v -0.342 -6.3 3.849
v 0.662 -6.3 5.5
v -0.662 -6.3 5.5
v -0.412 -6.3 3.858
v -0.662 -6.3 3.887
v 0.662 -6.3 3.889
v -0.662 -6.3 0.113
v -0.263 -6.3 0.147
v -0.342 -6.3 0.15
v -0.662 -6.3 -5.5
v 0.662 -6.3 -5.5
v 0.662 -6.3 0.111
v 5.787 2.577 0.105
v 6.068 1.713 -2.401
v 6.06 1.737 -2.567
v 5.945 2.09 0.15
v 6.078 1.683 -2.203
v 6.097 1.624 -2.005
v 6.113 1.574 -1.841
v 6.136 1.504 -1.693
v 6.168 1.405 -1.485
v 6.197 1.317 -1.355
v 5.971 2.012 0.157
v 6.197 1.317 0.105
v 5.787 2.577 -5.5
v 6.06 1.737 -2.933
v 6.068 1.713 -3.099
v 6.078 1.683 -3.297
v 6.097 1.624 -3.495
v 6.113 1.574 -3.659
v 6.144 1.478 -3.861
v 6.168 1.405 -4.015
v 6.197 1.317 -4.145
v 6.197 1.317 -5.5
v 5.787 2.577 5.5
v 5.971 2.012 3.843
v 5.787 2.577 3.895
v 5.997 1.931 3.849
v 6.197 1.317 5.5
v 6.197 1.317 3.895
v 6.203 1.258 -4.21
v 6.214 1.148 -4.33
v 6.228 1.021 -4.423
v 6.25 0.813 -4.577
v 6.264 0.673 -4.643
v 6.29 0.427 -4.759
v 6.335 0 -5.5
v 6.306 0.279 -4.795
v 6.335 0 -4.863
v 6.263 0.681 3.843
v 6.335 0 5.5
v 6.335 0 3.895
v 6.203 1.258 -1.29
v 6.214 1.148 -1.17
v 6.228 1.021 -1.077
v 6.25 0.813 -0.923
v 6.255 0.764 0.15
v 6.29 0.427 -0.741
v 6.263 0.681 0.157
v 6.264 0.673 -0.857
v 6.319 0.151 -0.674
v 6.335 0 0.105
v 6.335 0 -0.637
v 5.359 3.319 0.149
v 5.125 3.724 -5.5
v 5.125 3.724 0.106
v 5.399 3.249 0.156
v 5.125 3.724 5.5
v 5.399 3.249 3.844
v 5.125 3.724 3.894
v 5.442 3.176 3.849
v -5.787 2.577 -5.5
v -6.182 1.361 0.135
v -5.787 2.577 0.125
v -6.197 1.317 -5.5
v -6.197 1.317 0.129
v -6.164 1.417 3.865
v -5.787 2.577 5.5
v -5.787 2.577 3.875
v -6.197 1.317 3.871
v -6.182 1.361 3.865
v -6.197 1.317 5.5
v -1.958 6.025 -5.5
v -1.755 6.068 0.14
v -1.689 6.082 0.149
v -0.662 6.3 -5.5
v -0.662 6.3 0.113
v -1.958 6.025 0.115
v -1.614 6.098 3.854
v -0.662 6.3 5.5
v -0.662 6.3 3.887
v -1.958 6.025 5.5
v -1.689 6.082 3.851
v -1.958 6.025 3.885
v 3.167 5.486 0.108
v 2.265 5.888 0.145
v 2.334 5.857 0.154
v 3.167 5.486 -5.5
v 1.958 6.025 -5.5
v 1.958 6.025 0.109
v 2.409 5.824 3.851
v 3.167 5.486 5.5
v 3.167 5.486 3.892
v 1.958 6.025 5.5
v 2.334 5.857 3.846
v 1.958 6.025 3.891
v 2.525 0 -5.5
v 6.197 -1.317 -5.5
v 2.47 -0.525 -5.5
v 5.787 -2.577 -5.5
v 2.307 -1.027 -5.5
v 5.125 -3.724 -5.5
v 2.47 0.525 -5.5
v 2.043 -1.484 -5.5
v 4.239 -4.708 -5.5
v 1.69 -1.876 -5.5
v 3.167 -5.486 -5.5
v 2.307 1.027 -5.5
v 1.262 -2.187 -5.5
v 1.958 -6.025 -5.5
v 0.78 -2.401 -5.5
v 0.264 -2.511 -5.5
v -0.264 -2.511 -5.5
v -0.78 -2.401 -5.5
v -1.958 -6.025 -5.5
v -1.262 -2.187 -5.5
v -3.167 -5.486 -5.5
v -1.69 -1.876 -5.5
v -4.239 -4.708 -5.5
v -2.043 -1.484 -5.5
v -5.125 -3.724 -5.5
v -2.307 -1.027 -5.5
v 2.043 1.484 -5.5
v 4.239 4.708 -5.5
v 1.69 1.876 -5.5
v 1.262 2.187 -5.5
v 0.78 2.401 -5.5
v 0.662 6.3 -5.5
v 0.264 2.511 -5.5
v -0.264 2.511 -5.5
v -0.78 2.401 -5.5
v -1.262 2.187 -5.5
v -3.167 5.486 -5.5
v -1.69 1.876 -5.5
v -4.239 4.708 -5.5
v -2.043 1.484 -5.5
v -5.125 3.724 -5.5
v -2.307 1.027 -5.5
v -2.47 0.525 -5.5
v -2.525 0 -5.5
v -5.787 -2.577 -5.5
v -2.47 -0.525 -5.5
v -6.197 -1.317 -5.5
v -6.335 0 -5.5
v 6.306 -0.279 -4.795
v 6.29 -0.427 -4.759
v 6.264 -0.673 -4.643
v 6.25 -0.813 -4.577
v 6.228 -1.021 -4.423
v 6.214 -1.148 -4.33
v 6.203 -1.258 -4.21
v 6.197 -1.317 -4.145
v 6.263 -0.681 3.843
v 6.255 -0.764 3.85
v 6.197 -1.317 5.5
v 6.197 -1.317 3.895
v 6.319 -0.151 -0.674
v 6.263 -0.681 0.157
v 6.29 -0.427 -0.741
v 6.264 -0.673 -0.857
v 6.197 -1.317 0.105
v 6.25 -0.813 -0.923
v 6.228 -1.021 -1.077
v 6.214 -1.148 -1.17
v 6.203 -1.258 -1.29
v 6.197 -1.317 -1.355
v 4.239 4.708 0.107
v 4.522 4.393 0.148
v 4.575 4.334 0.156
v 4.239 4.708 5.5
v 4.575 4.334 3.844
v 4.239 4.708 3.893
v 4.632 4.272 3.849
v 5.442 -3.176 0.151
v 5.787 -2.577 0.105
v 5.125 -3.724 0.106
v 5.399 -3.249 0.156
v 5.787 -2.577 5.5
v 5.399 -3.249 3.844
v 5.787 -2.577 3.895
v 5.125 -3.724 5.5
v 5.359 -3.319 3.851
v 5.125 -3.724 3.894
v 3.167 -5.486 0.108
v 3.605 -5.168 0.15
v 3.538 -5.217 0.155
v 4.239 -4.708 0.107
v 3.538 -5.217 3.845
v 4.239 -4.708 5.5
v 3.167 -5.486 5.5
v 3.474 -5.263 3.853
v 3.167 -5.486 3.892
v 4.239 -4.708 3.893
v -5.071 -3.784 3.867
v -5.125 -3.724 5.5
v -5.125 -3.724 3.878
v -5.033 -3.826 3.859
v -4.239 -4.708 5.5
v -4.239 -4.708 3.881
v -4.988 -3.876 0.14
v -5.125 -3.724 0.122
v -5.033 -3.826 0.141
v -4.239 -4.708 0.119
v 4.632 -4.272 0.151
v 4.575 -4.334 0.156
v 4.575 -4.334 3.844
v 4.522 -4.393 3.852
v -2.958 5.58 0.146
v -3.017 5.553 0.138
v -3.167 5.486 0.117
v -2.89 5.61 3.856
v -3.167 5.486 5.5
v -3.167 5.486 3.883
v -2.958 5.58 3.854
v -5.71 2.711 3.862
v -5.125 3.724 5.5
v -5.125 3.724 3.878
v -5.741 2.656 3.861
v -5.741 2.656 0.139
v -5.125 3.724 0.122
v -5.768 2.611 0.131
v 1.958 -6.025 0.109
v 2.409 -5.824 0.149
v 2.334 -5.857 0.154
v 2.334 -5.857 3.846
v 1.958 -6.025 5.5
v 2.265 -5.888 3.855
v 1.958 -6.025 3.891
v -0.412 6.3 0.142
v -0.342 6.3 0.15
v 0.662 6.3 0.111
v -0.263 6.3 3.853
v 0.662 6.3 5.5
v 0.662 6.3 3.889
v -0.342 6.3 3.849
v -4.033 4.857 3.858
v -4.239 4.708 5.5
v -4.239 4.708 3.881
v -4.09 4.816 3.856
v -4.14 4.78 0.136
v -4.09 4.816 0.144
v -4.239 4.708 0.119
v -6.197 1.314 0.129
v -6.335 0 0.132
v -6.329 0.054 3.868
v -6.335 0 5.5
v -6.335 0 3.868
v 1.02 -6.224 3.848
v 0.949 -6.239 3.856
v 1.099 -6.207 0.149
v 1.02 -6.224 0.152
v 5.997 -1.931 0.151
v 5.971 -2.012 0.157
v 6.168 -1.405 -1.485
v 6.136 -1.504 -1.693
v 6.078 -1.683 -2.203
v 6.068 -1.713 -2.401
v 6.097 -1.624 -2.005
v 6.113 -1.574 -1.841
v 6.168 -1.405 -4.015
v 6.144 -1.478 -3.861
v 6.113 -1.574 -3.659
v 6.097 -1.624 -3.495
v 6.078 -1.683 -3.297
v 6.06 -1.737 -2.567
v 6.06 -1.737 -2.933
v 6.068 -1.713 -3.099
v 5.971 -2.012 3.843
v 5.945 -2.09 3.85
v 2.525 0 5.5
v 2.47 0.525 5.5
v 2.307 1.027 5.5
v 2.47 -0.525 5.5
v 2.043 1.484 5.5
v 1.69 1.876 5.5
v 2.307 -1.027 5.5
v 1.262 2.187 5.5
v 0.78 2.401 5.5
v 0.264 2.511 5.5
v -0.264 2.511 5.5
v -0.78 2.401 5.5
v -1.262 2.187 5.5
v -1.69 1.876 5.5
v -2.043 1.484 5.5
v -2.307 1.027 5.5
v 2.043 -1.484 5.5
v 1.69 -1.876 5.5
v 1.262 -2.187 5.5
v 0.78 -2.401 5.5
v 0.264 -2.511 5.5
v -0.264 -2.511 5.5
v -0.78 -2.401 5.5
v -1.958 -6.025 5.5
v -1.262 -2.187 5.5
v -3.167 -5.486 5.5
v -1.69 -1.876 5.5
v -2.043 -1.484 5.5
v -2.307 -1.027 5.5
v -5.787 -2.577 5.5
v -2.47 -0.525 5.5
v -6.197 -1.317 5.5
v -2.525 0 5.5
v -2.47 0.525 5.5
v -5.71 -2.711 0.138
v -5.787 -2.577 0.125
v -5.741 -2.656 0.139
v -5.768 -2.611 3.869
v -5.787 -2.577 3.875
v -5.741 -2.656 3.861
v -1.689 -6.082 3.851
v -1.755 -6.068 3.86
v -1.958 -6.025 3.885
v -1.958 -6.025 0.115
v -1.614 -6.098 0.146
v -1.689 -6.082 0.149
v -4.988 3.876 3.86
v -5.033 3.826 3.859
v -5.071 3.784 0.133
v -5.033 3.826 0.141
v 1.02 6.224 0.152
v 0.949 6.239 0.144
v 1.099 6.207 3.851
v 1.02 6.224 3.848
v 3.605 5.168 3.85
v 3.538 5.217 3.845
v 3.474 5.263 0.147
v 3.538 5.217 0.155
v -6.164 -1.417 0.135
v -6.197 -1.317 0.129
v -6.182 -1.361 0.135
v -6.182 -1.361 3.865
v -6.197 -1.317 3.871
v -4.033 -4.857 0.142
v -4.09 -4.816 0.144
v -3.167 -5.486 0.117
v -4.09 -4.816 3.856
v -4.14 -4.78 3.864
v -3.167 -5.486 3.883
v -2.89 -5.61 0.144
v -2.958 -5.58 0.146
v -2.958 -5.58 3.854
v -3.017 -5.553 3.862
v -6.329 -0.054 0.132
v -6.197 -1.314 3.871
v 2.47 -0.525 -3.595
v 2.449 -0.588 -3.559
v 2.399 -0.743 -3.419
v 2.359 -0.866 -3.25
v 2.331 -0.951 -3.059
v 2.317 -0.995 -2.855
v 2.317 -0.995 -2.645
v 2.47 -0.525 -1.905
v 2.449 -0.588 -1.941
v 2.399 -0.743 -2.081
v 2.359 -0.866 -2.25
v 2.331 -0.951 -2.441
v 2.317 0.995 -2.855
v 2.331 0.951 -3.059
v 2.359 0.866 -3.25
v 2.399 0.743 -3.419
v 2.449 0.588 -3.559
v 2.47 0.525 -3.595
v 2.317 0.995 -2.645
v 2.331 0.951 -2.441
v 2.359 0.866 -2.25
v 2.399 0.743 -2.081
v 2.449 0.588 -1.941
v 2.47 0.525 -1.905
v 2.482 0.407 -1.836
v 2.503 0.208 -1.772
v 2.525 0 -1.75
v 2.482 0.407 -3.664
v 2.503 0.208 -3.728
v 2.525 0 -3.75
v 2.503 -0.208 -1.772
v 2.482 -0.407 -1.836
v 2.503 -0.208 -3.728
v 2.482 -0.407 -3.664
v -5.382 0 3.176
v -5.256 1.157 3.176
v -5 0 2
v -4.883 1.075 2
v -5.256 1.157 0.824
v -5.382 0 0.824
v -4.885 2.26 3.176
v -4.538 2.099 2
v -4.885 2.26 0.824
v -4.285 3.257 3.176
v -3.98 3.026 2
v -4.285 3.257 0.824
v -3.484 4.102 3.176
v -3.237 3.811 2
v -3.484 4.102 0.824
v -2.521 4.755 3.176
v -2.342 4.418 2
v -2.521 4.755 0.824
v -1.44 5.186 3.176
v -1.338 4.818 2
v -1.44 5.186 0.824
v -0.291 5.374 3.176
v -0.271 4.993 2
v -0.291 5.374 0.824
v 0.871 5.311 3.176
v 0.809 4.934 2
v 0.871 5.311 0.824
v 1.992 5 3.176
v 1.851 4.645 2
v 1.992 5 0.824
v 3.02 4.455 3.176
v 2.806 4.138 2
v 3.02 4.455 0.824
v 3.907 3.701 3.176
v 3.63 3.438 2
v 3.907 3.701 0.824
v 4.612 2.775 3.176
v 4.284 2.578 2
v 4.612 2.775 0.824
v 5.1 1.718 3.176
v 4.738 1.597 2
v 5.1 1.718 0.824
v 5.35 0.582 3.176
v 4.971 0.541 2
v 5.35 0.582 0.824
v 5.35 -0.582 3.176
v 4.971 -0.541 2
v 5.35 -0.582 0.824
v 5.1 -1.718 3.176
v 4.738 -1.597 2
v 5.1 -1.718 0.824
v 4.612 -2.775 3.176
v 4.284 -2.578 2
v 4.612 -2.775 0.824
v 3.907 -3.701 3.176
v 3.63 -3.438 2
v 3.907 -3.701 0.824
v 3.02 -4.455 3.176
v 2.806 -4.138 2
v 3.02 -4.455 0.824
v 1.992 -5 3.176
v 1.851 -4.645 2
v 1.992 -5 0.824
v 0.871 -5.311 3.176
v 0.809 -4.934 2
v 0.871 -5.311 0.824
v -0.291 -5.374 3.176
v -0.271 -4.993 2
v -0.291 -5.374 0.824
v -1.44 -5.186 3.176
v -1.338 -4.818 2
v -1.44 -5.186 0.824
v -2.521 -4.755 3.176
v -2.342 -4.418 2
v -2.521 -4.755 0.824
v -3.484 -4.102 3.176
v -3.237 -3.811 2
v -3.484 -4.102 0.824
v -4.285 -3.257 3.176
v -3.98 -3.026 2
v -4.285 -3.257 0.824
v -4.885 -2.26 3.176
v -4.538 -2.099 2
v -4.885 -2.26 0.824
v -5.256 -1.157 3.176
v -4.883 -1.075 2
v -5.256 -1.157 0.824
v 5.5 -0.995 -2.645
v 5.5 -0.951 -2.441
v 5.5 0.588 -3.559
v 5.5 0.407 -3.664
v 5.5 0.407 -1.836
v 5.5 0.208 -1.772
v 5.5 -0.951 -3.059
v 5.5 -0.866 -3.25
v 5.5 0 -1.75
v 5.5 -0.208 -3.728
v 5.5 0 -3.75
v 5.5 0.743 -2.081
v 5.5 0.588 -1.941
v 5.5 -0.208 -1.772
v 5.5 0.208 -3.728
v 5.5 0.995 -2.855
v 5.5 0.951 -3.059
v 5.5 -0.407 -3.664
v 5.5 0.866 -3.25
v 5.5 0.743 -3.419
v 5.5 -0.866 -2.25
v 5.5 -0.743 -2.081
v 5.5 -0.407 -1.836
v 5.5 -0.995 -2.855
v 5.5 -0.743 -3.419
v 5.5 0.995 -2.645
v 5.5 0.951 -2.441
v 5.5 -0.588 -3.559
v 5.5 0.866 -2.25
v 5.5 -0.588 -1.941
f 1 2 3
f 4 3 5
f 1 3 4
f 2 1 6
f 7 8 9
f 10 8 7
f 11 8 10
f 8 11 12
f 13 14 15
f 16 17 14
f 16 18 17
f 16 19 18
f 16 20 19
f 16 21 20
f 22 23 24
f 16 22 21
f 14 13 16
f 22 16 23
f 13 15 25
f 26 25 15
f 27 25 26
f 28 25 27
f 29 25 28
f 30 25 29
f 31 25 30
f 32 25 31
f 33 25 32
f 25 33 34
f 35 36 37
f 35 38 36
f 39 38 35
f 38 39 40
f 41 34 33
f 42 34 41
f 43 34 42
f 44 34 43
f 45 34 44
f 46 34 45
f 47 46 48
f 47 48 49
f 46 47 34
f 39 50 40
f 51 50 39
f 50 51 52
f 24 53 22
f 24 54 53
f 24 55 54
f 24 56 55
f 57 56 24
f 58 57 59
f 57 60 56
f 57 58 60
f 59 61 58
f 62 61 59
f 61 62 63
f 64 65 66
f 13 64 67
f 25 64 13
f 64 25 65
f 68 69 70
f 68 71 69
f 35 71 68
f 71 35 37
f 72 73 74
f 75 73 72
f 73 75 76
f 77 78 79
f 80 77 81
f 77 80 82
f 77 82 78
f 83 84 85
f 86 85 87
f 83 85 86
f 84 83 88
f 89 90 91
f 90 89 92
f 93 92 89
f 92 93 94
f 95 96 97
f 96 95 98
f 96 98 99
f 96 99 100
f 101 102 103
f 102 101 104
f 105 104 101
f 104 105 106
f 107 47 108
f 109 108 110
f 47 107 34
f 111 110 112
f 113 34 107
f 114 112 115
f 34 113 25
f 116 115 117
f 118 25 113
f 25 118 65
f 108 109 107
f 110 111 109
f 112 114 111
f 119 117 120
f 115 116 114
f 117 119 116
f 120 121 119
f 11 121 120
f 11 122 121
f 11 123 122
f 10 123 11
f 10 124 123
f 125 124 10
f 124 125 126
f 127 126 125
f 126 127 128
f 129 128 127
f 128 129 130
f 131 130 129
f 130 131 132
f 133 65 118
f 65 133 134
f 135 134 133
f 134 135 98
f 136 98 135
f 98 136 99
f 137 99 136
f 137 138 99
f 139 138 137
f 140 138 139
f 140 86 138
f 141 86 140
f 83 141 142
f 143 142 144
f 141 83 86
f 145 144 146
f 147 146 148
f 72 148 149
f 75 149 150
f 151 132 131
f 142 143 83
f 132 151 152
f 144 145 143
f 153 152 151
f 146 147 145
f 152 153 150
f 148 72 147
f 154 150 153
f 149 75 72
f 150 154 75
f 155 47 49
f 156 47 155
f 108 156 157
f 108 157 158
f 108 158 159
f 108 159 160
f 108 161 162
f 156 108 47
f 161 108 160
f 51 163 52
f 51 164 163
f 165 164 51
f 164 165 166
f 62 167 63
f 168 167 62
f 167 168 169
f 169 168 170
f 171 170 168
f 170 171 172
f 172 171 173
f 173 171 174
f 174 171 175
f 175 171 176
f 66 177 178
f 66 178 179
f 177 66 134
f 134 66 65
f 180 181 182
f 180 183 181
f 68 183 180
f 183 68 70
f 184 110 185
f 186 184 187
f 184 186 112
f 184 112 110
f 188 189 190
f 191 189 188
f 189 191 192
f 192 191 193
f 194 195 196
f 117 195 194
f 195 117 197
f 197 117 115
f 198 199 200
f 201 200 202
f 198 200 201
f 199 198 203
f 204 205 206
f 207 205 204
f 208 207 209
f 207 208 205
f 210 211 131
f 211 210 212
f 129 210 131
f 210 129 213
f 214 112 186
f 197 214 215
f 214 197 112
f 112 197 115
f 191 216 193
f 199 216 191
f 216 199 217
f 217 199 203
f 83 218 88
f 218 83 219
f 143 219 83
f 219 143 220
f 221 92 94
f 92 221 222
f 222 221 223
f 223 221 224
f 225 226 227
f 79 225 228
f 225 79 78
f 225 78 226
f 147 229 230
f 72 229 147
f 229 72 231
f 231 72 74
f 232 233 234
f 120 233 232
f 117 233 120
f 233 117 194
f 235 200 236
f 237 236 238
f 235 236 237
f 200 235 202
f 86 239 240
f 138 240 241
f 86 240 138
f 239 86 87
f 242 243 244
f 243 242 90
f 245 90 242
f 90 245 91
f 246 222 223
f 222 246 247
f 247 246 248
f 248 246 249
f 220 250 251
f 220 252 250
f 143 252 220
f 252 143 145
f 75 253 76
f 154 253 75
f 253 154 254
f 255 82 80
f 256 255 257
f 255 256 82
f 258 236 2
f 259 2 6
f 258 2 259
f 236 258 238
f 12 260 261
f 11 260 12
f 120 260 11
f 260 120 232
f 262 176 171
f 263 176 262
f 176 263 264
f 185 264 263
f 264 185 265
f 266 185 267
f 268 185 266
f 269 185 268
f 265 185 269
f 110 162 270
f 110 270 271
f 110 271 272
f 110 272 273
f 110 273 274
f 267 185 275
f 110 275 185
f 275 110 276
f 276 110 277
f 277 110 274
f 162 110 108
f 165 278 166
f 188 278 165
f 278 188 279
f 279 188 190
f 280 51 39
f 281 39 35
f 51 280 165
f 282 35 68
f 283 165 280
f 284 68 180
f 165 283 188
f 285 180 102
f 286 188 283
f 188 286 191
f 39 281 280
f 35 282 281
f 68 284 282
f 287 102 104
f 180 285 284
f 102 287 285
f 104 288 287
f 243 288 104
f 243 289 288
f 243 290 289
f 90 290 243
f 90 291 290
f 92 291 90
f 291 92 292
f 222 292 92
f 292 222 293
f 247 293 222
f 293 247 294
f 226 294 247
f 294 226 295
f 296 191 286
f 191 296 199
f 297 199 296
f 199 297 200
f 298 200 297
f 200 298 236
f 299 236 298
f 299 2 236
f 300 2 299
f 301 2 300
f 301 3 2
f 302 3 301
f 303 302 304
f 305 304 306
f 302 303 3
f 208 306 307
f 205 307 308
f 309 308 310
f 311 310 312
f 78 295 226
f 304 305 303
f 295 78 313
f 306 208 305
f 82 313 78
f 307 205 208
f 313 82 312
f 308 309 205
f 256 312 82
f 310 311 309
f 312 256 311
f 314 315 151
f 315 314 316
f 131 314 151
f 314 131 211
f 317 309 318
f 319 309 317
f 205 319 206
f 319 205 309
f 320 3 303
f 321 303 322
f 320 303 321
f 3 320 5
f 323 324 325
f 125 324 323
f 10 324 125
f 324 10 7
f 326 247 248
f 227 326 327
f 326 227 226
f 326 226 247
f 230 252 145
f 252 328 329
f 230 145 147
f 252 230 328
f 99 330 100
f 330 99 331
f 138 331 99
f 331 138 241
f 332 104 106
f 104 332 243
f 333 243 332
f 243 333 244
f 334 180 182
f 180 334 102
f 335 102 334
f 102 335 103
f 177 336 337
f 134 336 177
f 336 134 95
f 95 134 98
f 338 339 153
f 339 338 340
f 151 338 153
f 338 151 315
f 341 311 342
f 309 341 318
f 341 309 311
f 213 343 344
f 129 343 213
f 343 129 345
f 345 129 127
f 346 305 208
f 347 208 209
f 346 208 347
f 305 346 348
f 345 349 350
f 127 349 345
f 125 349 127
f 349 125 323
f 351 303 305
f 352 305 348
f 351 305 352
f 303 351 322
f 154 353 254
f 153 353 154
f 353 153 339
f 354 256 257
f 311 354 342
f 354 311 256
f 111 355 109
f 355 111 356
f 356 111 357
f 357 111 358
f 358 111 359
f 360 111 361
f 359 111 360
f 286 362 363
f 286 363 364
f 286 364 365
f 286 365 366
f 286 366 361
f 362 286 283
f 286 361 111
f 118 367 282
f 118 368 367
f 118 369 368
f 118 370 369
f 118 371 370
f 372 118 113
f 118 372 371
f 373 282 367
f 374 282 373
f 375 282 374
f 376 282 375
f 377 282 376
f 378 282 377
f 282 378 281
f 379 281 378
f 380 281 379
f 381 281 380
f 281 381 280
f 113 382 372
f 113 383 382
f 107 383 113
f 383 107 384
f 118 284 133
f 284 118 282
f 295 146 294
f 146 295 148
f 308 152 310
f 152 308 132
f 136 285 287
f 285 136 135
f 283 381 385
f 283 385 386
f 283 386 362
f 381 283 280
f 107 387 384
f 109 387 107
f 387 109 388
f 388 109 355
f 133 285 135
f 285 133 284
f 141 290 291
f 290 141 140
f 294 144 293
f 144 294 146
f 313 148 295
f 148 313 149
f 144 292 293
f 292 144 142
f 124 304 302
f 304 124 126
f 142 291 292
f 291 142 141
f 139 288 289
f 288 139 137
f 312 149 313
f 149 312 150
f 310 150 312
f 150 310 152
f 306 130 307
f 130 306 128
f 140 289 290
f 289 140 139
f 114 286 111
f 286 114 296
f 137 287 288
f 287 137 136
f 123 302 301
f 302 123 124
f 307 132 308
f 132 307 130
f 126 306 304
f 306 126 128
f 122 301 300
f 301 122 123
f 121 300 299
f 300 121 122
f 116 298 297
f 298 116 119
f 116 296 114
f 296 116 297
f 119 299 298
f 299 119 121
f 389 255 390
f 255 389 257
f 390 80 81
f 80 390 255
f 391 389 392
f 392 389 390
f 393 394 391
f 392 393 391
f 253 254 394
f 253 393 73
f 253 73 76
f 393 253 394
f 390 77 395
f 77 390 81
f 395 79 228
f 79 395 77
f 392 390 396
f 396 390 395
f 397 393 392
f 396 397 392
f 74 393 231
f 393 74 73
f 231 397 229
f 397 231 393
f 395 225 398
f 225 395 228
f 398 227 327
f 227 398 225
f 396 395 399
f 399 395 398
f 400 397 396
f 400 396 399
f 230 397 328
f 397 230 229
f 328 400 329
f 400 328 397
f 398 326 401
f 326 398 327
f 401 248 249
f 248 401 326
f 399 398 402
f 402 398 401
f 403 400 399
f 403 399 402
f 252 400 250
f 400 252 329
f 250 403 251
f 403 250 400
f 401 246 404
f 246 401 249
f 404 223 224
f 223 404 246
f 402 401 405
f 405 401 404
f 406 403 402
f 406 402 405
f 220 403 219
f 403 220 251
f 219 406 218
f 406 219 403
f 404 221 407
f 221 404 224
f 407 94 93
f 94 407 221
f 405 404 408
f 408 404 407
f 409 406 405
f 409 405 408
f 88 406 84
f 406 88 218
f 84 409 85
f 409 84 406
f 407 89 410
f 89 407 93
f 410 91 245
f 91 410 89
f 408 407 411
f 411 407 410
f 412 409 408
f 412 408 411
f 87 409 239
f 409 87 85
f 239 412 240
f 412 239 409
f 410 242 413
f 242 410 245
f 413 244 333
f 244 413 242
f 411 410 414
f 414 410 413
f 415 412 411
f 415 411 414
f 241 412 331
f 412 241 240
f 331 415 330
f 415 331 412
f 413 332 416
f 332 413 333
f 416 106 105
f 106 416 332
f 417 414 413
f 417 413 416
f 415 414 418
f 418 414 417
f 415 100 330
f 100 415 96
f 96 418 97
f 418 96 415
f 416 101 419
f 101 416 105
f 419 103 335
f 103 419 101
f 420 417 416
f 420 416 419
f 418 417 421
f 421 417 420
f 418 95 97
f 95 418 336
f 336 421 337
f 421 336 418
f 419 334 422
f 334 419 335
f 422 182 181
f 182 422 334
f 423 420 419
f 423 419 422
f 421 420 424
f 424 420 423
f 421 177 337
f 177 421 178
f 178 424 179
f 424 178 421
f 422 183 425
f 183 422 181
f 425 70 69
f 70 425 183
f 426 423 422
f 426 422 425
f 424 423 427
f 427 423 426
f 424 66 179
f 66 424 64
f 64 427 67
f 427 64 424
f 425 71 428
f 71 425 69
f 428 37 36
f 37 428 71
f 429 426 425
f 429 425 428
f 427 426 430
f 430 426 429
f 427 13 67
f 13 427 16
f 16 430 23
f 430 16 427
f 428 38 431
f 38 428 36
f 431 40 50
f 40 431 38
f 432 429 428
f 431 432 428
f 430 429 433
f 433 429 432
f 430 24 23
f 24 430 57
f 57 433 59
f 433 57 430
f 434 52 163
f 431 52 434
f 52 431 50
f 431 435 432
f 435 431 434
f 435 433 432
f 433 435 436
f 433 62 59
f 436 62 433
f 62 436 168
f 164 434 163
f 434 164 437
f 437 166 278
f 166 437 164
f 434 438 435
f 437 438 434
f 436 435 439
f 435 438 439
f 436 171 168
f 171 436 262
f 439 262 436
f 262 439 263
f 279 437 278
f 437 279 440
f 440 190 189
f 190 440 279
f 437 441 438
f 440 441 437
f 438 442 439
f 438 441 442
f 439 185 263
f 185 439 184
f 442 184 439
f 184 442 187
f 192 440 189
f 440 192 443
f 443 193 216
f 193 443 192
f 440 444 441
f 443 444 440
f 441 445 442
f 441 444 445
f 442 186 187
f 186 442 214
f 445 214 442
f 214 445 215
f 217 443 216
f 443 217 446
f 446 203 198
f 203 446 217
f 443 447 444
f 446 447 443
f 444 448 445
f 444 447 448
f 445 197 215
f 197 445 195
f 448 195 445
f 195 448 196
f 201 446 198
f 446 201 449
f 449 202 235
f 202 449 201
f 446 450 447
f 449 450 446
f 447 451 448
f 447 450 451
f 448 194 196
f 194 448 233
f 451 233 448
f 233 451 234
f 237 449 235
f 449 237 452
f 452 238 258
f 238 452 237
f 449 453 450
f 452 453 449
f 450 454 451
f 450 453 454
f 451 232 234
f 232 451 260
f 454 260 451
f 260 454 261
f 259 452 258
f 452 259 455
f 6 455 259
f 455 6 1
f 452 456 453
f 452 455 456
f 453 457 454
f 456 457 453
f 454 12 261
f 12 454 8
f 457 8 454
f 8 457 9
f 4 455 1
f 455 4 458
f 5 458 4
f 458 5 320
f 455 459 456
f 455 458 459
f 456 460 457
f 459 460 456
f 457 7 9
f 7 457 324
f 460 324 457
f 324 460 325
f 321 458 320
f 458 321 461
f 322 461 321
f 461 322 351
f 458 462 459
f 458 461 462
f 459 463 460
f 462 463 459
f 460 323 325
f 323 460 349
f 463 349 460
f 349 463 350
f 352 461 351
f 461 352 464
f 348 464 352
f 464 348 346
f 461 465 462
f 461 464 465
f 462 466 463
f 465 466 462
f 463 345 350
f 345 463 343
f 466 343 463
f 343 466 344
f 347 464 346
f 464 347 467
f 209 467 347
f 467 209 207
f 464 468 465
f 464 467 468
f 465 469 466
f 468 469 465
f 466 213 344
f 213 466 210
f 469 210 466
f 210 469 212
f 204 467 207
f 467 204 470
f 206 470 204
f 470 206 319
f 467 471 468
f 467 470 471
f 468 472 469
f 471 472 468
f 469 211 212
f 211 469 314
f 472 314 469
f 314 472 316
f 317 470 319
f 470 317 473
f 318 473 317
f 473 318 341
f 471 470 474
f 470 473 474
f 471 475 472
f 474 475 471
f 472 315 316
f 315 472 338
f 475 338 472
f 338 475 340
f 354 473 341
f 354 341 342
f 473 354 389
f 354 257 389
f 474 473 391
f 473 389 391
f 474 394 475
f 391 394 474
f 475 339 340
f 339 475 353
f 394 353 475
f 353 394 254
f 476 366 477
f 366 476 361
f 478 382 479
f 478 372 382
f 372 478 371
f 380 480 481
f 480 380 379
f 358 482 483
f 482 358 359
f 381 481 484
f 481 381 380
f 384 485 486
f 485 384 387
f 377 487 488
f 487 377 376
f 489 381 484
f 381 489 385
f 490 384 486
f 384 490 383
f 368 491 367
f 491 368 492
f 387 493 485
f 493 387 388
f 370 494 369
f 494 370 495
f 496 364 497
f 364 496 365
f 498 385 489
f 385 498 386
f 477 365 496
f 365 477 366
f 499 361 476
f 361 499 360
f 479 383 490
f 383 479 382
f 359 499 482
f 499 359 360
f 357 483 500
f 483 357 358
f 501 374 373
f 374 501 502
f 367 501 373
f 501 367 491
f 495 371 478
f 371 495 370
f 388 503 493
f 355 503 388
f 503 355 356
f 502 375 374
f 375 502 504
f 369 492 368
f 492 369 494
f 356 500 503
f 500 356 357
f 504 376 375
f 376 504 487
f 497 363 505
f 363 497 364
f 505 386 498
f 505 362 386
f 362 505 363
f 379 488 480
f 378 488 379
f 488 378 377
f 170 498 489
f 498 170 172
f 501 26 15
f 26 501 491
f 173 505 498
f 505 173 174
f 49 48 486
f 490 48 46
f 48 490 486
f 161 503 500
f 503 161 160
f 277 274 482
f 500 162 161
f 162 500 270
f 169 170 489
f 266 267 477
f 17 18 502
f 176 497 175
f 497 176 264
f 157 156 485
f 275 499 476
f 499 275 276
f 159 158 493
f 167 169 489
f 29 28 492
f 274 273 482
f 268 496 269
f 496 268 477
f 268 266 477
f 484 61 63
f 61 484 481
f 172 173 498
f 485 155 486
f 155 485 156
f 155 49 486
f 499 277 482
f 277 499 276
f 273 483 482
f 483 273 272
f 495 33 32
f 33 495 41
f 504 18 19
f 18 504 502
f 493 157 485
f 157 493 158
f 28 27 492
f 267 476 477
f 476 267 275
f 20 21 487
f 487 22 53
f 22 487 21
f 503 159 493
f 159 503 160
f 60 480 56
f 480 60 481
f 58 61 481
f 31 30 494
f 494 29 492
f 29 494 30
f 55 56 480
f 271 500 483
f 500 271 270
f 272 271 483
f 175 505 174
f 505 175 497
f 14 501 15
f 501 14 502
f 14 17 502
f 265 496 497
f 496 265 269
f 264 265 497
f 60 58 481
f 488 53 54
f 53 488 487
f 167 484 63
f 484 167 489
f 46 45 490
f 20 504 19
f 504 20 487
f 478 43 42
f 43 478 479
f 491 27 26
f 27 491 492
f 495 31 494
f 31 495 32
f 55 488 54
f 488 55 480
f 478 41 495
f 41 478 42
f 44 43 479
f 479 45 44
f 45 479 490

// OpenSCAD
// TrinityLabs MK7 Hobbed Pulley

module hobb() {
	rotate_extrude(convexity=10) translate([7,0,0]) circle(r=2, $fn=10);
}

module mk7() {
	difference() {
		cylinder(r=12.67/2, h=11, center=true, $fn=30);
		cylinder(r=5.05/2, h=12, center=true, $fn=30);
		translate([0,0,2]) hobb();
		translate([4,0,-2.75]) rotate([0,90,0]) 
			cylinder(r=1, h=6, center=true, $fn=30);
		translate([7,0,-2.75]) rotate([0,90,0]) 
			cylinder(r1=1, r2=5, h=3, center=true, $fn=30);
	}
}

mk7();
